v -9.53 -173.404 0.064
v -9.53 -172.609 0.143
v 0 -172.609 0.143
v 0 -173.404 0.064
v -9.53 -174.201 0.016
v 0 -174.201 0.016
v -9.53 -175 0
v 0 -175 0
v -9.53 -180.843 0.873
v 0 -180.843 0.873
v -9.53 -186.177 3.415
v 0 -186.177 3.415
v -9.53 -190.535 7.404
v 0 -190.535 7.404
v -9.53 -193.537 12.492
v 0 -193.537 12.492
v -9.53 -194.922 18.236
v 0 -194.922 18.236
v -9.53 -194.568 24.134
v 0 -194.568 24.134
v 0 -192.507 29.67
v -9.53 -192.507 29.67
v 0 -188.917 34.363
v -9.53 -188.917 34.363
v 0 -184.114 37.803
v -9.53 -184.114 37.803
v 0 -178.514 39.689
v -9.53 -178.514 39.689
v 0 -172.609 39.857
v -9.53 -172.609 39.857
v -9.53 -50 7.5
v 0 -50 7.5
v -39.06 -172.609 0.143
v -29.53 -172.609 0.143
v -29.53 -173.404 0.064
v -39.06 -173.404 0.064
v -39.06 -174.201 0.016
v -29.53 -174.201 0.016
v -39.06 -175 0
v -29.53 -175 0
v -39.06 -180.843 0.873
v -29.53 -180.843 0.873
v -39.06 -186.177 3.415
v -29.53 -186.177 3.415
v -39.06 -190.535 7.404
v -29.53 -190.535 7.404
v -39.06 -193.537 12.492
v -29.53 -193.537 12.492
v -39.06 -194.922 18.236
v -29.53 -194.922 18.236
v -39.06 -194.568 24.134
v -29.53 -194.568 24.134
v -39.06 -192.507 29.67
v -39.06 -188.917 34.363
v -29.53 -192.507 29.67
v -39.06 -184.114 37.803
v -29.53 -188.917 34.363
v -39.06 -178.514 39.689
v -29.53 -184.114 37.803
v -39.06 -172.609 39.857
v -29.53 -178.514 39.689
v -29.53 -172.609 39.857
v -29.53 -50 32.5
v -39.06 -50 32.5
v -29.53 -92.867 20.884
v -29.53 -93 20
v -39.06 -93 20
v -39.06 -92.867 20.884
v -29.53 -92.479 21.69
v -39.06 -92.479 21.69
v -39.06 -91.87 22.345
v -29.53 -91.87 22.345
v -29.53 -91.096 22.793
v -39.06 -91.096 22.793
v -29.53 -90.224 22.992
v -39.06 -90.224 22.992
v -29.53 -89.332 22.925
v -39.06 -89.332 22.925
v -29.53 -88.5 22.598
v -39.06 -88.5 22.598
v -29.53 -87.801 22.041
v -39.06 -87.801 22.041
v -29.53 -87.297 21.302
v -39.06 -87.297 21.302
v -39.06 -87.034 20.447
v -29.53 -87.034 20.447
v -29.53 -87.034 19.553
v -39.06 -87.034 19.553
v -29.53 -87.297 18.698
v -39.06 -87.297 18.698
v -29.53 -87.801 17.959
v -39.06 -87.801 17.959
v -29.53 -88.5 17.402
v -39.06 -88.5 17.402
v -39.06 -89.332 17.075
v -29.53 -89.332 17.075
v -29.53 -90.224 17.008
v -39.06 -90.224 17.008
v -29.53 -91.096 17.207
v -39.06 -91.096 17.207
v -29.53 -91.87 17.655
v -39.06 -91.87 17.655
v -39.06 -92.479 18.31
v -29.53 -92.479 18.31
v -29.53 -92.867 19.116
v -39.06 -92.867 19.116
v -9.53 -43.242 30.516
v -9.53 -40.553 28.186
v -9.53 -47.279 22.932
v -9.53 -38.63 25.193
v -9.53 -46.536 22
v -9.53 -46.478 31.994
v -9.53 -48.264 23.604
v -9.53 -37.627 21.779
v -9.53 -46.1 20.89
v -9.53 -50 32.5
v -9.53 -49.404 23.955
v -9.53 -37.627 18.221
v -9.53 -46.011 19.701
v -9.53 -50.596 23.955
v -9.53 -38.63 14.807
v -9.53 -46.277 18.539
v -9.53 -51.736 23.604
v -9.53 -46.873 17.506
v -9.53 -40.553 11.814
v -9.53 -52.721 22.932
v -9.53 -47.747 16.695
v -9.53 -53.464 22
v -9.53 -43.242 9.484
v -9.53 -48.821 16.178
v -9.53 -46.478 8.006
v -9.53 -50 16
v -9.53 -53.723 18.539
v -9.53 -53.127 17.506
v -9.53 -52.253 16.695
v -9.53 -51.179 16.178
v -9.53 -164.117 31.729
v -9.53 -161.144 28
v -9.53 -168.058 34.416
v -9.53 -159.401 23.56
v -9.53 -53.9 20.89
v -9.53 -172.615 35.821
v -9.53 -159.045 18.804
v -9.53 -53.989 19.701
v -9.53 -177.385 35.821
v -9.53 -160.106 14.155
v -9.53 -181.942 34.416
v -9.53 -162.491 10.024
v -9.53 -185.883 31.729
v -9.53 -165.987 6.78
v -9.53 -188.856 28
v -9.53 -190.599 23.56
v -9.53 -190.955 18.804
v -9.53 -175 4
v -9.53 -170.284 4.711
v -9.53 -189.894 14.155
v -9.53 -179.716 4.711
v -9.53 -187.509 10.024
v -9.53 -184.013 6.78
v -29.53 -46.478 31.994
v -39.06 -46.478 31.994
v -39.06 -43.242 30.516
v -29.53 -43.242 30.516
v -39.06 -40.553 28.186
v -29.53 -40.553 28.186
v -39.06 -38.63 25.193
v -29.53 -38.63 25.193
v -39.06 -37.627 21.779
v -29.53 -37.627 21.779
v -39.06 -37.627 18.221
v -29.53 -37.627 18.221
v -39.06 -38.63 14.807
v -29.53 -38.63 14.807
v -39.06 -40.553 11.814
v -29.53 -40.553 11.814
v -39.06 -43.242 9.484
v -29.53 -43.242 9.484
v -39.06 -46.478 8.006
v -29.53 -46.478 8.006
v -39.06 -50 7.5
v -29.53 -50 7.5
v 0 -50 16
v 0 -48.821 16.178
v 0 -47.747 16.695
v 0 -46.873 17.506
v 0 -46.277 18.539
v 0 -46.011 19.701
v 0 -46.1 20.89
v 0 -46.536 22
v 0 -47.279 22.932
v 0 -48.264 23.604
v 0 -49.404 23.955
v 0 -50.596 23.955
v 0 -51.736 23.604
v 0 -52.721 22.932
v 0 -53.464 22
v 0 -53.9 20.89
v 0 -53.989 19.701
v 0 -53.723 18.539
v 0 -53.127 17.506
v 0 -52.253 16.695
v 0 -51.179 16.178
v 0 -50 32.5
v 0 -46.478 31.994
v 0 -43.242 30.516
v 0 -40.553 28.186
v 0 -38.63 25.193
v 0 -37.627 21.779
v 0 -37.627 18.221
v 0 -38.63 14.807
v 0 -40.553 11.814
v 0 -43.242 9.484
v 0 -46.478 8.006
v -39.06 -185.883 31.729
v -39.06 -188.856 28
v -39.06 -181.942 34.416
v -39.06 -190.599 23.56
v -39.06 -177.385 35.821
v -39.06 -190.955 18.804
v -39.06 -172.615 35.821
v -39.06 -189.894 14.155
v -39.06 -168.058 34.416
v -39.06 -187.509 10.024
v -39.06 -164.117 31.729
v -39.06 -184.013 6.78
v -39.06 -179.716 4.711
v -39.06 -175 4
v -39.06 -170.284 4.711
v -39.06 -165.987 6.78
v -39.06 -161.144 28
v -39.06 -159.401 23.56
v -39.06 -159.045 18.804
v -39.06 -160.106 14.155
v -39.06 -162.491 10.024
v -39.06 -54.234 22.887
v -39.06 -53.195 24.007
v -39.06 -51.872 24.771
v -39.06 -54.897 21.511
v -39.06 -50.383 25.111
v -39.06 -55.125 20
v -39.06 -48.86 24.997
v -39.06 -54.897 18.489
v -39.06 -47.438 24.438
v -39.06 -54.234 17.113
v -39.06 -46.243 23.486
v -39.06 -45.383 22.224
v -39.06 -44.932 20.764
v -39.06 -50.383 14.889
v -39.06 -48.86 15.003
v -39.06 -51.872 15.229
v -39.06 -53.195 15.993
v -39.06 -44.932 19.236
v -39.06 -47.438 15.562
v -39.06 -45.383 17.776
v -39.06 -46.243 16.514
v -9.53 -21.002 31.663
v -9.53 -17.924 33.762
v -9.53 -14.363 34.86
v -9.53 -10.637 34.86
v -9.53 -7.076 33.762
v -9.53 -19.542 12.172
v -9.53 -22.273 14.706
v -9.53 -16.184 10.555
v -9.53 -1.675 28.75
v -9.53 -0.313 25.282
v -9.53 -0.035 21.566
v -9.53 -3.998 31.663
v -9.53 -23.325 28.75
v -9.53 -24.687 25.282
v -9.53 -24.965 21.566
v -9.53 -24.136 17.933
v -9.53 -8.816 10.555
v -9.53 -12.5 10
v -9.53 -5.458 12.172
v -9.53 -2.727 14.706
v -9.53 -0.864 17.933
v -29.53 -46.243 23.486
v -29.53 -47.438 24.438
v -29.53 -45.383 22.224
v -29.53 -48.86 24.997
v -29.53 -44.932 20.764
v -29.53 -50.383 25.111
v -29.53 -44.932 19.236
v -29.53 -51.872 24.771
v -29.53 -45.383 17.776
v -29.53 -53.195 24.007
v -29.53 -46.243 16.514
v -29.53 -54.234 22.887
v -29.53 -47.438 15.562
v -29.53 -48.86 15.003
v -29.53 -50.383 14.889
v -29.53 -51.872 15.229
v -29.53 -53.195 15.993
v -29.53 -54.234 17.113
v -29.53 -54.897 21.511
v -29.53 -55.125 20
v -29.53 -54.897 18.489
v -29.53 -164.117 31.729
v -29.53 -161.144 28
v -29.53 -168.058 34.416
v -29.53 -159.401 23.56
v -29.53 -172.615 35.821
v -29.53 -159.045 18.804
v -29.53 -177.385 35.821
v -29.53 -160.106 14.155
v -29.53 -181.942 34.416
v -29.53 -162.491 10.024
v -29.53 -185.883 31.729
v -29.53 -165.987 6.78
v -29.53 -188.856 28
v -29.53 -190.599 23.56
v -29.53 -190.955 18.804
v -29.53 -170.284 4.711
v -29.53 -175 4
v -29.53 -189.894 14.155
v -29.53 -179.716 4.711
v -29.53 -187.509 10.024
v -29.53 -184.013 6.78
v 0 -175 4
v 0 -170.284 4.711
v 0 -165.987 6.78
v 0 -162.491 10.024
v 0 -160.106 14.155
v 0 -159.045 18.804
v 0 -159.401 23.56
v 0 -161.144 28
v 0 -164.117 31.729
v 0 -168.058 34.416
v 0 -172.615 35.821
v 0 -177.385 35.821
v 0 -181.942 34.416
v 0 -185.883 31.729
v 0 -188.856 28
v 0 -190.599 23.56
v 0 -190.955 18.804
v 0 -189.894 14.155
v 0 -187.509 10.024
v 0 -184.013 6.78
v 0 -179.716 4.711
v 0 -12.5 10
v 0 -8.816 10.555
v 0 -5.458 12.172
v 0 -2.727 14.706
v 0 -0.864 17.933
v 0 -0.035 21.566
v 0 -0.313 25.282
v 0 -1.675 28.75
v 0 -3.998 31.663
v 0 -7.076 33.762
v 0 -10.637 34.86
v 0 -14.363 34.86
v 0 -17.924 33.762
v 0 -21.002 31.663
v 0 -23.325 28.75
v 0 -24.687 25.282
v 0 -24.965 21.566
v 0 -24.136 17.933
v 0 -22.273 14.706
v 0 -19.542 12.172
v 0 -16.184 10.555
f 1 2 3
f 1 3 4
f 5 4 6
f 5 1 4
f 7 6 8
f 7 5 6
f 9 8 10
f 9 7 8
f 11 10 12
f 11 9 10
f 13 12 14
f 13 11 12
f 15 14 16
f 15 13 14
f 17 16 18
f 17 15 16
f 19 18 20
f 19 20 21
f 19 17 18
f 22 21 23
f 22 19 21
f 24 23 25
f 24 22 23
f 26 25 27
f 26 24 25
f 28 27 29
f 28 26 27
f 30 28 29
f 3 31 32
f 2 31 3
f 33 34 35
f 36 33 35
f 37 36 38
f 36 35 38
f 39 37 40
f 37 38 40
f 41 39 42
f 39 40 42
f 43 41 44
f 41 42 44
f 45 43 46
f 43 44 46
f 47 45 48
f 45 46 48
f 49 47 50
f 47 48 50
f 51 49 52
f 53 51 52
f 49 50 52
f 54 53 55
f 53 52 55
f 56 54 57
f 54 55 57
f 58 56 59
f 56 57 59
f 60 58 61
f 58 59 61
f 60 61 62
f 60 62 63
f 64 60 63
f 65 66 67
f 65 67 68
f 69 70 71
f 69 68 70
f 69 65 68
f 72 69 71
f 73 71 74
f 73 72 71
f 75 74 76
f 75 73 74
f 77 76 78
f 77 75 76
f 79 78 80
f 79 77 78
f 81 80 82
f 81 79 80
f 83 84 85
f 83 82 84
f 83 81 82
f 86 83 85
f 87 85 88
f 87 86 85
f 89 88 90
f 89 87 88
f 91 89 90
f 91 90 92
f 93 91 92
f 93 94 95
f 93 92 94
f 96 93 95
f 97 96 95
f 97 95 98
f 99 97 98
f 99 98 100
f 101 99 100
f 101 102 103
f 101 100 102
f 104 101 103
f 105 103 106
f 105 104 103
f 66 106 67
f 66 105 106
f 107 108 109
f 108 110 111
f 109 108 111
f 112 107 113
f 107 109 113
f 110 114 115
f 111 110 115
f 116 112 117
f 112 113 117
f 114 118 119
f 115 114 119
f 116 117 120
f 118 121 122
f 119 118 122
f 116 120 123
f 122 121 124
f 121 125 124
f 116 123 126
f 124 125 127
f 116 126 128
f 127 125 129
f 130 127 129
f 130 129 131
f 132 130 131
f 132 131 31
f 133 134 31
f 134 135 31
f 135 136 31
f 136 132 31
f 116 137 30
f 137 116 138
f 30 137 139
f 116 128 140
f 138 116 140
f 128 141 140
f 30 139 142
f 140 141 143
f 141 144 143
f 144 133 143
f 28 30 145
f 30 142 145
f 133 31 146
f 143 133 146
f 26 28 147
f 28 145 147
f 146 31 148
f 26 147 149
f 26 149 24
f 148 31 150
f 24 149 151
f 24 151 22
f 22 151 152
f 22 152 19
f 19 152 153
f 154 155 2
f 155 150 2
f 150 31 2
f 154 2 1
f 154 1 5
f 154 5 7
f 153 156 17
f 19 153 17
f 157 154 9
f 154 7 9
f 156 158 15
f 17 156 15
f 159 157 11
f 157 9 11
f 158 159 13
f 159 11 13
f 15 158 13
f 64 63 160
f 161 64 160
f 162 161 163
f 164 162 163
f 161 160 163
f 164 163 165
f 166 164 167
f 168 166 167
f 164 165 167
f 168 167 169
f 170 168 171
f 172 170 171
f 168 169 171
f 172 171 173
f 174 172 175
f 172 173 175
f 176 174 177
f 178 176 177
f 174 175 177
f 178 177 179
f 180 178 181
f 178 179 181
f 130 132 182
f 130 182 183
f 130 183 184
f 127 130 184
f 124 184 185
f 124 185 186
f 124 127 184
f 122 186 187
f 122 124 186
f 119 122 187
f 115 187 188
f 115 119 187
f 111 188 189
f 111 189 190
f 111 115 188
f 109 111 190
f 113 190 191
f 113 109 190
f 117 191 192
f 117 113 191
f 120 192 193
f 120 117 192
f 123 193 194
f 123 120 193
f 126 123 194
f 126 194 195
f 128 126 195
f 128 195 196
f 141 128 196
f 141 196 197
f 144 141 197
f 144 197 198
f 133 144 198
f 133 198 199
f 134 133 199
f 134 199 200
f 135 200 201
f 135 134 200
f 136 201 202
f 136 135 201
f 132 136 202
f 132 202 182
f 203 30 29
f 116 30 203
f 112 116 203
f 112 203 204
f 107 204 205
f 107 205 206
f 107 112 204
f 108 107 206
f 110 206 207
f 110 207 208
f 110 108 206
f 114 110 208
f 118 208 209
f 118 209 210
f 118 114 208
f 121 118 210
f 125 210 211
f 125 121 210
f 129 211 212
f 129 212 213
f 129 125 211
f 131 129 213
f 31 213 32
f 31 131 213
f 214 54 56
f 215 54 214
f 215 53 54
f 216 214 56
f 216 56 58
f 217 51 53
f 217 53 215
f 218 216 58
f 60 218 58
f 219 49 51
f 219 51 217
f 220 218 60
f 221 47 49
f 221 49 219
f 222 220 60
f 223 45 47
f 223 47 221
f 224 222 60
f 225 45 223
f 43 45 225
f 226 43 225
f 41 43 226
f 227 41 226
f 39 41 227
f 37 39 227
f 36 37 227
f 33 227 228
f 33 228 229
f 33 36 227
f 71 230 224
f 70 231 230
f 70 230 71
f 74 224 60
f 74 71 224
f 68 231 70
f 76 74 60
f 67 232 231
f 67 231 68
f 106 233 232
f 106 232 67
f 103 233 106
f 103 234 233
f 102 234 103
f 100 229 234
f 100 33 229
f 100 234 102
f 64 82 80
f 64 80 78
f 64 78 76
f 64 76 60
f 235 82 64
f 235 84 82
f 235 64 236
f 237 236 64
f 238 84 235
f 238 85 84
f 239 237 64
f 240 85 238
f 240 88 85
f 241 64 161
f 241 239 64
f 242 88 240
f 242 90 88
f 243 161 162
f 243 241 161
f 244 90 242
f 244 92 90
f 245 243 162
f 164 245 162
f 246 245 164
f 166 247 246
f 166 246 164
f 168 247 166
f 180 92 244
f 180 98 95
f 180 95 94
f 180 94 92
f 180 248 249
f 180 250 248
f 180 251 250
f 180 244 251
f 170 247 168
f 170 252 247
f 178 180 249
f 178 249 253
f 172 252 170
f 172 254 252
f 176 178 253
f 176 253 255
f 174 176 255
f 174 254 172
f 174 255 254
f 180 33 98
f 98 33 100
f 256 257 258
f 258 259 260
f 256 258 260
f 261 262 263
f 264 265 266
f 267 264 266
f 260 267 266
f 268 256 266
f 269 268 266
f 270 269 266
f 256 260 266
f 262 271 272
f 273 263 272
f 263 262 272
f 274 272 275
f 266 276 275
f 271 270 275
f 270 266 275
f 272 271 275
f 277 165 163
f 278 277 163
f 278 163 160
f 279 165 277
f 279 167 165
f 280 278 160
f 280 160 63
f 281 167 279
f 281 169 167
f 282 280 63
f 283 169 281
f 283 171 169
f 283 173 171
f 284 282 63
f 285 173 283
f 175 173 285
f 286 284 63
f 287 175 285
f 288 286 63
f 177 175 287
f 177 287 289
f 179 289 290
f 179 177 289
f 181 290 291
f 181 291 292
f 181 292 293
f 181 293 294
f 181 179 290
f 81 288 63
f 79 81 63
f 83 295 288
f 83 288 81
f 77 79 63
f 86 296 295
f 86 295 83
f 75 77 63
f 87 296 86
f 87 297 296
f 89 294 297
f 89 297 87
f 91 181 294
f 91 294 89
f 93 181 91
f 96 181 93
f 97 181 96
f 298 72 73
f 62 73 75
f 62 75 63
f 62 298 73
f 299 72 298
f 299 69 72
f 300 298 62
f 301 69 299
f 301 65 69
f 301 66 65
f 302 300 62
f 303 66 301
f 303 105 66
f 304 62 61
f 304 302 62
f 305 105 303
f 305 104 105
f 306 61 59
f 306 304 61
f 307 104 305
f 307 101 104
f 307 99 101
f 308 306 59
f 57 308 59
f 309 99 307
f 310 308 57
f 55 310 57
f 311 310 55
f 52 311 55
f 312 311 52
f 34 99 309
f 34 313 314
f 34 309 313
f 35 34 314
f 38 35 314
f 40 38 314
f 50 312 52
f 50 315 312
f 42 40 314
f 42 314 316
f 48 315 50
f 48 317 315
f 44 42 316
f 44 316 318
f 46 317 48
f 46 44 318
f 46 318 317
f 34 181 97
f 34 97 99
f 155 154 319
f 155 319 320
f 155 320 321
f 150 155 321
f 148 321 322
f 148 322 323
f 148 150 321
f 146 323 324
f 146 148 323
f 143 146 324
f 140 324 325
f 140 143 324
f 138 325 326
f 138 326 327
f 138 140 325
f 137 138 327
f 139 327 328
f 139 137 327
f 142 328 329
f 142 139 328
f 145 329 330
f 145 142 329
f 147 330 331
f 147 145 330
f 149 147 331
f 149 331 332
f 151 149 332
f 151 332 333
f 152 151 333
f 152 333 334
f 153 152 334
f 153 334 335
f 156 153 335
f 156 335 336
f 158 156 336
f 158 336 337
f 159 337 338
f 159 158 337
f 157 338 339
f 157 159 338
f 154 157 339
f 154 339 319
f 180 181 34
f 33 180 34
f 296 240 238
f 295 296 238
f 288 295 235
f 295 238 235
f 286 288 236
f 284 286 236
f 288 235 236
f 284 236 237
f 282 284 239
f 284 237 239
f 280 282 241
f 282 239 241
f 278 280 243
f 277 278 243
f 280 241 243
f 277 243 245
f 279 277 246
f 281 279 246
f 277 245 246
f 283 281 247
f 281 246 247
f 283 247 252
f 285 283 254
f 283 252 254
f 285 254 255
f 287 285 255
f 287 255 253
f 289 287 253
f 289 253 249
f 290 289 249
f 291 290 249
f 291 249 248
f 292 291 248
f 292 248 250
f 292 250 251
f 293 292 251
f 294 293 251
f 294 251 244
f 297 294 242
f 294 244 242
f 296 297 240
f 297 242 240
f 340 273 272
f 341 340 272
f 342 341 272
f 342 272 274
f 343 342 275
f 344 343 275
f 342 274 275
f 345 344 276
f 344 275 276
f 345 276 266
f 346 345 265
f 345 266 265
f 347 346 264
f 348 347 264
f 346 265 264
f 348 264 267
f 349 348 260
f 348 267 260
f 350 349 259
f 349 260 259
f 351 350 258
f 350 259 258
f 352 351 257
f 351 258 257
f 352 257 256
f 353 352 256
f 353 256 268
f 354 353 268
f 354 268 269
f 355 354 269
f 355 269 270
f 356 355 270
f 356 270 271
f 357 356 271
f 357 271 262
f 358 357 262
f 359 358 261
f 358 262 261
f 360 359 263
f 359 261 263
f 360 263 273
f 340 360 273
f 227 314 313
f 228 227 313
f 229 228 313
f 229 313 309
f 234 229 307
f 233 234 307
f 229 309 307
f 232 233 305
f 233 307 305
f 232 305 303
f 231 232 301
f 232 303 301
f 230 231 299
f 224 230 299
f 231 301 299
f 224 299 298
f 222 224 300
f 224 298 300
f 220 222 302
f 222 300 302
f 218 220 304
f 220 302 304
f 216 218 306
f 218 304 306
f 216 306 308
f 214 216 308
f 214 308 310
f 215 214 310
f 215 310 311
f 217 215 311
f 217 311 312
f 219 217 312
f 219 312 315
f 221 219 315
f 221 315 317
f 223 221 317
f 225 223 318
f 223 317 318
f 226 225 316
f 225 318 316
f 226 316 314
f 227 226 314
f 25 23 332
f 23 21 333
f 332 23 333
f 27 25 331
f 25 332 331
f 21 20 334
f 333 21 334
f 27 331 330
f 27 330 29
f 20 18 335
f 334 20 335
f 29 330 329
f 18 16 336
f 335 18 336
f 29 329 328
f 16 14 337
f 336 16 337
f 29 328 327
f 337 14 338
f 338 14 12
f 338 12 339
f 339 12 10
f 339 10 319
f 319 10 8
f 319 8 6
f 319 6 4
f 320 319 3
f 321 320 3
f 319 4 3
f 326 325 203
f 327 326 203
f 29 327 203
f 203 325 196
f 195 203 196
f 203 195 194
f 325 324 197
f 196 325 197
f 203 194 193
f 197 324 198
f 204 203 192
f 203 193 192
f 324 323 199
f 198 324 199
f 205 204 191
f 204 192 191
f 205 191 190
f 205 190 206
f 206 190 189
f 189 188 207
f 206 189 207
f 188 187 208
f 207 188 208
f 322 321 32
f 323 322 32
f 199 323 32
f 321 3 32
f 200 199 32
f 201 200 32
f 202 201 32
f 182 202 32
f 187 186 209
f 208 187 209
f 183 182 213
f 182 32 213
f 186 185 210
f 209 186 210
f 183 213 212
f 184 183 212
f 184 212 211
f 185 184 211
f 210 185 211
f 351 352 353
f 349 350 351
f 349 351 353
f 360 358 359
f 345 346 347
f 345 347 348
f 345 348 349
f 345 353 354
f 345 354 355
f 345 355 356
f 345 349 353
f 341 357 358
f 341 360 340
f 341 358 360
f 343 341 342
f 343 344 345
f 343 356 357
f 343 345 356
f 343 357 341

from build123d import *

# Parameters (mm, degrees)
SALIENTE_EXTRUIR1_DEPTH     = 45
CORTAR_EXTRUIR1_START       = -9.53
CORTAR_EXTRUIR1_OUTLINE_R   = 16
CORTAR_EXTRUIR1_OUTLINE_R_2 = 4
CORTAR_EXTRUIR1_DEPTH       = 9.53
CORTAR_EXTRUIR1_2_OUTLINE_R = 12.5
CORTAR_EXTRUIR1_2_DEPTH     = 9.53
CORTAR_EXTRUIR2_DEPTH       = 203.856312695
CORTAR_EXTRUIR2_DEPTH_BACK  = 203.856312695
CROQUIS3_R                  = 3
CROQUIS6_R                  = 4
SALIENTE_EXTRUIR2_DEPTH     = 9.53
CROQUIS7_R                  = 5.125
CORTAR_EXTRUIR3_DEPTH       = 9.53


# Read off the part's stored shape, not the designer's step: Cortar-Extruir1
with BuildPart() as part:
    # Croquis1 → Saliente-Extruir1 (new body)
    with BuildSketch(Plane.XY):
        Polygon((0, -195), (-9.53, -195), (-9.53, -150.957826949), (-9.53, -125.957826949), (-9.53, -37.272336593), (-9.53, -22.648156901), (-9.53, 0), (0, 0), (0, -22.648156901), (0, -37.272336593), (0, -126.527583158), (0, -153), align=None)
    extrude(amount=SALIENTE_EXTRUIR1_DEPTH)

    # Cortar-Extruir1 outline → Cortar-Extruir1 (cut)
    with BuildSketch(Plane(origin=(0, 0, 0), x_dir=(0, 0, -1), z_dir=(1, 0, 0)).offset(CORTAR_EXTRUIR1_START)):
        with Locations((-20, -175)):
            Circle(CORTAR_EXTRUIR1_OUTLINE_R)
        with BuildLine():
            ThreePointArc((-20, -195), (-34.963753203, -188.269743407), (-39.85651654, -172.608609008))
            Line((-39.85651654, -172.608609008), (-32.5, -50))
            ThreePointArc((-32.5, -50), (-20, -37.5), (-7.5, -50))
            Line((-7.5, -50), (-0.14348346, -172.608609008))
            ThreePointArc((-0.14348346, -172.608609008), (-0.035903091, -173.802154186), (0, -175))
            Line((0, -175), (0, 0))
            Line((0, 0), (-45, 0))
            Line((-45, 0), (-45, -195))
            Line((-45, -195), (-20, -195))
        make_face()
        with BuildLine():
            ThreePointArc((0, -175), (-5.857864377, -189.142135624), (-20, -195))
            Line((-20, -195), (0, -195))
            Line((0, -195), (0, -175))
        make_face()
        with Locations((-20, -50)):
            Circle(CORTAR_EXTRUIR1_OUTLINE_R_2)
    extrude(amount=CORTAR_EXTRUIR1_DEPTH, mode=Mode.SUBTRACT)


with BuildPart() as body_2:
    # Cortar-Extruir1 2 outline → Cortar-Extruir1 2 (new body)
    with BuildSketch(Plane(origin=(0, 0, 0), x_dir=(0, 0, -1), z_dir=(1, 0, 0)).offset(CORTAR_EXTRUIR1_START)):
        with Locations((-22.5, -12.5)):
            Circle(CORTAR_EXTRUIR1_2_OUTLINE_R)
    extrude(amount=CORTAR_EXTRUIR1_2_DEPTH)


with BuildPart() as body_3:
    # Simetría2: mirrored copy
    add(part.part.mirror(Plane.ZY.offset(19.53)))

    # Croquis3 → Cortar-Extruir2 (cut, two sides: drawn at the far end of the back side and taken through both)
    with BuildSketch(Plane.ZY.offset(39.06).offset(-CORTAR_EXTRUIR2_DEPTH_BACK)):
        with Locations(Location((20, -90, 0), (0, 0, 270))):
            Circle(CROQUIS3_R)
    extrude(amount=CORTAR_EXTRUIR2_DEPTH + CORTAR_EXTRUIR2_DEPTH_BACK, mode=Mode.SUBTRACT)

    # Croquis6 → Saliente-Extruir2 (add)
    with BuildSketch(Plane.ZY.offset(39.06)):
        with Locations(Location((20, -50, 0), (0, 0, 90))):
            Circle(CROQUIS6_R)
    extrude(amount=-SALIENTE_EXTRUIR2_DEPTH)

    # Croquis7 → Cortar-Extruir3 (cut)
    with BuildSketch(Plane.ZY.offset(39.06)):
        with Locations(Location((20, -50, 0), (0, 0, 270))):
            Circle(CROQUIS7_R)
    extrude(amount=-CORTAR_EXTRUIR3_DEPTH, mode=Mode.SUBTRACT)


solid = Compound([part.part, body_2.part, body_3.part])
